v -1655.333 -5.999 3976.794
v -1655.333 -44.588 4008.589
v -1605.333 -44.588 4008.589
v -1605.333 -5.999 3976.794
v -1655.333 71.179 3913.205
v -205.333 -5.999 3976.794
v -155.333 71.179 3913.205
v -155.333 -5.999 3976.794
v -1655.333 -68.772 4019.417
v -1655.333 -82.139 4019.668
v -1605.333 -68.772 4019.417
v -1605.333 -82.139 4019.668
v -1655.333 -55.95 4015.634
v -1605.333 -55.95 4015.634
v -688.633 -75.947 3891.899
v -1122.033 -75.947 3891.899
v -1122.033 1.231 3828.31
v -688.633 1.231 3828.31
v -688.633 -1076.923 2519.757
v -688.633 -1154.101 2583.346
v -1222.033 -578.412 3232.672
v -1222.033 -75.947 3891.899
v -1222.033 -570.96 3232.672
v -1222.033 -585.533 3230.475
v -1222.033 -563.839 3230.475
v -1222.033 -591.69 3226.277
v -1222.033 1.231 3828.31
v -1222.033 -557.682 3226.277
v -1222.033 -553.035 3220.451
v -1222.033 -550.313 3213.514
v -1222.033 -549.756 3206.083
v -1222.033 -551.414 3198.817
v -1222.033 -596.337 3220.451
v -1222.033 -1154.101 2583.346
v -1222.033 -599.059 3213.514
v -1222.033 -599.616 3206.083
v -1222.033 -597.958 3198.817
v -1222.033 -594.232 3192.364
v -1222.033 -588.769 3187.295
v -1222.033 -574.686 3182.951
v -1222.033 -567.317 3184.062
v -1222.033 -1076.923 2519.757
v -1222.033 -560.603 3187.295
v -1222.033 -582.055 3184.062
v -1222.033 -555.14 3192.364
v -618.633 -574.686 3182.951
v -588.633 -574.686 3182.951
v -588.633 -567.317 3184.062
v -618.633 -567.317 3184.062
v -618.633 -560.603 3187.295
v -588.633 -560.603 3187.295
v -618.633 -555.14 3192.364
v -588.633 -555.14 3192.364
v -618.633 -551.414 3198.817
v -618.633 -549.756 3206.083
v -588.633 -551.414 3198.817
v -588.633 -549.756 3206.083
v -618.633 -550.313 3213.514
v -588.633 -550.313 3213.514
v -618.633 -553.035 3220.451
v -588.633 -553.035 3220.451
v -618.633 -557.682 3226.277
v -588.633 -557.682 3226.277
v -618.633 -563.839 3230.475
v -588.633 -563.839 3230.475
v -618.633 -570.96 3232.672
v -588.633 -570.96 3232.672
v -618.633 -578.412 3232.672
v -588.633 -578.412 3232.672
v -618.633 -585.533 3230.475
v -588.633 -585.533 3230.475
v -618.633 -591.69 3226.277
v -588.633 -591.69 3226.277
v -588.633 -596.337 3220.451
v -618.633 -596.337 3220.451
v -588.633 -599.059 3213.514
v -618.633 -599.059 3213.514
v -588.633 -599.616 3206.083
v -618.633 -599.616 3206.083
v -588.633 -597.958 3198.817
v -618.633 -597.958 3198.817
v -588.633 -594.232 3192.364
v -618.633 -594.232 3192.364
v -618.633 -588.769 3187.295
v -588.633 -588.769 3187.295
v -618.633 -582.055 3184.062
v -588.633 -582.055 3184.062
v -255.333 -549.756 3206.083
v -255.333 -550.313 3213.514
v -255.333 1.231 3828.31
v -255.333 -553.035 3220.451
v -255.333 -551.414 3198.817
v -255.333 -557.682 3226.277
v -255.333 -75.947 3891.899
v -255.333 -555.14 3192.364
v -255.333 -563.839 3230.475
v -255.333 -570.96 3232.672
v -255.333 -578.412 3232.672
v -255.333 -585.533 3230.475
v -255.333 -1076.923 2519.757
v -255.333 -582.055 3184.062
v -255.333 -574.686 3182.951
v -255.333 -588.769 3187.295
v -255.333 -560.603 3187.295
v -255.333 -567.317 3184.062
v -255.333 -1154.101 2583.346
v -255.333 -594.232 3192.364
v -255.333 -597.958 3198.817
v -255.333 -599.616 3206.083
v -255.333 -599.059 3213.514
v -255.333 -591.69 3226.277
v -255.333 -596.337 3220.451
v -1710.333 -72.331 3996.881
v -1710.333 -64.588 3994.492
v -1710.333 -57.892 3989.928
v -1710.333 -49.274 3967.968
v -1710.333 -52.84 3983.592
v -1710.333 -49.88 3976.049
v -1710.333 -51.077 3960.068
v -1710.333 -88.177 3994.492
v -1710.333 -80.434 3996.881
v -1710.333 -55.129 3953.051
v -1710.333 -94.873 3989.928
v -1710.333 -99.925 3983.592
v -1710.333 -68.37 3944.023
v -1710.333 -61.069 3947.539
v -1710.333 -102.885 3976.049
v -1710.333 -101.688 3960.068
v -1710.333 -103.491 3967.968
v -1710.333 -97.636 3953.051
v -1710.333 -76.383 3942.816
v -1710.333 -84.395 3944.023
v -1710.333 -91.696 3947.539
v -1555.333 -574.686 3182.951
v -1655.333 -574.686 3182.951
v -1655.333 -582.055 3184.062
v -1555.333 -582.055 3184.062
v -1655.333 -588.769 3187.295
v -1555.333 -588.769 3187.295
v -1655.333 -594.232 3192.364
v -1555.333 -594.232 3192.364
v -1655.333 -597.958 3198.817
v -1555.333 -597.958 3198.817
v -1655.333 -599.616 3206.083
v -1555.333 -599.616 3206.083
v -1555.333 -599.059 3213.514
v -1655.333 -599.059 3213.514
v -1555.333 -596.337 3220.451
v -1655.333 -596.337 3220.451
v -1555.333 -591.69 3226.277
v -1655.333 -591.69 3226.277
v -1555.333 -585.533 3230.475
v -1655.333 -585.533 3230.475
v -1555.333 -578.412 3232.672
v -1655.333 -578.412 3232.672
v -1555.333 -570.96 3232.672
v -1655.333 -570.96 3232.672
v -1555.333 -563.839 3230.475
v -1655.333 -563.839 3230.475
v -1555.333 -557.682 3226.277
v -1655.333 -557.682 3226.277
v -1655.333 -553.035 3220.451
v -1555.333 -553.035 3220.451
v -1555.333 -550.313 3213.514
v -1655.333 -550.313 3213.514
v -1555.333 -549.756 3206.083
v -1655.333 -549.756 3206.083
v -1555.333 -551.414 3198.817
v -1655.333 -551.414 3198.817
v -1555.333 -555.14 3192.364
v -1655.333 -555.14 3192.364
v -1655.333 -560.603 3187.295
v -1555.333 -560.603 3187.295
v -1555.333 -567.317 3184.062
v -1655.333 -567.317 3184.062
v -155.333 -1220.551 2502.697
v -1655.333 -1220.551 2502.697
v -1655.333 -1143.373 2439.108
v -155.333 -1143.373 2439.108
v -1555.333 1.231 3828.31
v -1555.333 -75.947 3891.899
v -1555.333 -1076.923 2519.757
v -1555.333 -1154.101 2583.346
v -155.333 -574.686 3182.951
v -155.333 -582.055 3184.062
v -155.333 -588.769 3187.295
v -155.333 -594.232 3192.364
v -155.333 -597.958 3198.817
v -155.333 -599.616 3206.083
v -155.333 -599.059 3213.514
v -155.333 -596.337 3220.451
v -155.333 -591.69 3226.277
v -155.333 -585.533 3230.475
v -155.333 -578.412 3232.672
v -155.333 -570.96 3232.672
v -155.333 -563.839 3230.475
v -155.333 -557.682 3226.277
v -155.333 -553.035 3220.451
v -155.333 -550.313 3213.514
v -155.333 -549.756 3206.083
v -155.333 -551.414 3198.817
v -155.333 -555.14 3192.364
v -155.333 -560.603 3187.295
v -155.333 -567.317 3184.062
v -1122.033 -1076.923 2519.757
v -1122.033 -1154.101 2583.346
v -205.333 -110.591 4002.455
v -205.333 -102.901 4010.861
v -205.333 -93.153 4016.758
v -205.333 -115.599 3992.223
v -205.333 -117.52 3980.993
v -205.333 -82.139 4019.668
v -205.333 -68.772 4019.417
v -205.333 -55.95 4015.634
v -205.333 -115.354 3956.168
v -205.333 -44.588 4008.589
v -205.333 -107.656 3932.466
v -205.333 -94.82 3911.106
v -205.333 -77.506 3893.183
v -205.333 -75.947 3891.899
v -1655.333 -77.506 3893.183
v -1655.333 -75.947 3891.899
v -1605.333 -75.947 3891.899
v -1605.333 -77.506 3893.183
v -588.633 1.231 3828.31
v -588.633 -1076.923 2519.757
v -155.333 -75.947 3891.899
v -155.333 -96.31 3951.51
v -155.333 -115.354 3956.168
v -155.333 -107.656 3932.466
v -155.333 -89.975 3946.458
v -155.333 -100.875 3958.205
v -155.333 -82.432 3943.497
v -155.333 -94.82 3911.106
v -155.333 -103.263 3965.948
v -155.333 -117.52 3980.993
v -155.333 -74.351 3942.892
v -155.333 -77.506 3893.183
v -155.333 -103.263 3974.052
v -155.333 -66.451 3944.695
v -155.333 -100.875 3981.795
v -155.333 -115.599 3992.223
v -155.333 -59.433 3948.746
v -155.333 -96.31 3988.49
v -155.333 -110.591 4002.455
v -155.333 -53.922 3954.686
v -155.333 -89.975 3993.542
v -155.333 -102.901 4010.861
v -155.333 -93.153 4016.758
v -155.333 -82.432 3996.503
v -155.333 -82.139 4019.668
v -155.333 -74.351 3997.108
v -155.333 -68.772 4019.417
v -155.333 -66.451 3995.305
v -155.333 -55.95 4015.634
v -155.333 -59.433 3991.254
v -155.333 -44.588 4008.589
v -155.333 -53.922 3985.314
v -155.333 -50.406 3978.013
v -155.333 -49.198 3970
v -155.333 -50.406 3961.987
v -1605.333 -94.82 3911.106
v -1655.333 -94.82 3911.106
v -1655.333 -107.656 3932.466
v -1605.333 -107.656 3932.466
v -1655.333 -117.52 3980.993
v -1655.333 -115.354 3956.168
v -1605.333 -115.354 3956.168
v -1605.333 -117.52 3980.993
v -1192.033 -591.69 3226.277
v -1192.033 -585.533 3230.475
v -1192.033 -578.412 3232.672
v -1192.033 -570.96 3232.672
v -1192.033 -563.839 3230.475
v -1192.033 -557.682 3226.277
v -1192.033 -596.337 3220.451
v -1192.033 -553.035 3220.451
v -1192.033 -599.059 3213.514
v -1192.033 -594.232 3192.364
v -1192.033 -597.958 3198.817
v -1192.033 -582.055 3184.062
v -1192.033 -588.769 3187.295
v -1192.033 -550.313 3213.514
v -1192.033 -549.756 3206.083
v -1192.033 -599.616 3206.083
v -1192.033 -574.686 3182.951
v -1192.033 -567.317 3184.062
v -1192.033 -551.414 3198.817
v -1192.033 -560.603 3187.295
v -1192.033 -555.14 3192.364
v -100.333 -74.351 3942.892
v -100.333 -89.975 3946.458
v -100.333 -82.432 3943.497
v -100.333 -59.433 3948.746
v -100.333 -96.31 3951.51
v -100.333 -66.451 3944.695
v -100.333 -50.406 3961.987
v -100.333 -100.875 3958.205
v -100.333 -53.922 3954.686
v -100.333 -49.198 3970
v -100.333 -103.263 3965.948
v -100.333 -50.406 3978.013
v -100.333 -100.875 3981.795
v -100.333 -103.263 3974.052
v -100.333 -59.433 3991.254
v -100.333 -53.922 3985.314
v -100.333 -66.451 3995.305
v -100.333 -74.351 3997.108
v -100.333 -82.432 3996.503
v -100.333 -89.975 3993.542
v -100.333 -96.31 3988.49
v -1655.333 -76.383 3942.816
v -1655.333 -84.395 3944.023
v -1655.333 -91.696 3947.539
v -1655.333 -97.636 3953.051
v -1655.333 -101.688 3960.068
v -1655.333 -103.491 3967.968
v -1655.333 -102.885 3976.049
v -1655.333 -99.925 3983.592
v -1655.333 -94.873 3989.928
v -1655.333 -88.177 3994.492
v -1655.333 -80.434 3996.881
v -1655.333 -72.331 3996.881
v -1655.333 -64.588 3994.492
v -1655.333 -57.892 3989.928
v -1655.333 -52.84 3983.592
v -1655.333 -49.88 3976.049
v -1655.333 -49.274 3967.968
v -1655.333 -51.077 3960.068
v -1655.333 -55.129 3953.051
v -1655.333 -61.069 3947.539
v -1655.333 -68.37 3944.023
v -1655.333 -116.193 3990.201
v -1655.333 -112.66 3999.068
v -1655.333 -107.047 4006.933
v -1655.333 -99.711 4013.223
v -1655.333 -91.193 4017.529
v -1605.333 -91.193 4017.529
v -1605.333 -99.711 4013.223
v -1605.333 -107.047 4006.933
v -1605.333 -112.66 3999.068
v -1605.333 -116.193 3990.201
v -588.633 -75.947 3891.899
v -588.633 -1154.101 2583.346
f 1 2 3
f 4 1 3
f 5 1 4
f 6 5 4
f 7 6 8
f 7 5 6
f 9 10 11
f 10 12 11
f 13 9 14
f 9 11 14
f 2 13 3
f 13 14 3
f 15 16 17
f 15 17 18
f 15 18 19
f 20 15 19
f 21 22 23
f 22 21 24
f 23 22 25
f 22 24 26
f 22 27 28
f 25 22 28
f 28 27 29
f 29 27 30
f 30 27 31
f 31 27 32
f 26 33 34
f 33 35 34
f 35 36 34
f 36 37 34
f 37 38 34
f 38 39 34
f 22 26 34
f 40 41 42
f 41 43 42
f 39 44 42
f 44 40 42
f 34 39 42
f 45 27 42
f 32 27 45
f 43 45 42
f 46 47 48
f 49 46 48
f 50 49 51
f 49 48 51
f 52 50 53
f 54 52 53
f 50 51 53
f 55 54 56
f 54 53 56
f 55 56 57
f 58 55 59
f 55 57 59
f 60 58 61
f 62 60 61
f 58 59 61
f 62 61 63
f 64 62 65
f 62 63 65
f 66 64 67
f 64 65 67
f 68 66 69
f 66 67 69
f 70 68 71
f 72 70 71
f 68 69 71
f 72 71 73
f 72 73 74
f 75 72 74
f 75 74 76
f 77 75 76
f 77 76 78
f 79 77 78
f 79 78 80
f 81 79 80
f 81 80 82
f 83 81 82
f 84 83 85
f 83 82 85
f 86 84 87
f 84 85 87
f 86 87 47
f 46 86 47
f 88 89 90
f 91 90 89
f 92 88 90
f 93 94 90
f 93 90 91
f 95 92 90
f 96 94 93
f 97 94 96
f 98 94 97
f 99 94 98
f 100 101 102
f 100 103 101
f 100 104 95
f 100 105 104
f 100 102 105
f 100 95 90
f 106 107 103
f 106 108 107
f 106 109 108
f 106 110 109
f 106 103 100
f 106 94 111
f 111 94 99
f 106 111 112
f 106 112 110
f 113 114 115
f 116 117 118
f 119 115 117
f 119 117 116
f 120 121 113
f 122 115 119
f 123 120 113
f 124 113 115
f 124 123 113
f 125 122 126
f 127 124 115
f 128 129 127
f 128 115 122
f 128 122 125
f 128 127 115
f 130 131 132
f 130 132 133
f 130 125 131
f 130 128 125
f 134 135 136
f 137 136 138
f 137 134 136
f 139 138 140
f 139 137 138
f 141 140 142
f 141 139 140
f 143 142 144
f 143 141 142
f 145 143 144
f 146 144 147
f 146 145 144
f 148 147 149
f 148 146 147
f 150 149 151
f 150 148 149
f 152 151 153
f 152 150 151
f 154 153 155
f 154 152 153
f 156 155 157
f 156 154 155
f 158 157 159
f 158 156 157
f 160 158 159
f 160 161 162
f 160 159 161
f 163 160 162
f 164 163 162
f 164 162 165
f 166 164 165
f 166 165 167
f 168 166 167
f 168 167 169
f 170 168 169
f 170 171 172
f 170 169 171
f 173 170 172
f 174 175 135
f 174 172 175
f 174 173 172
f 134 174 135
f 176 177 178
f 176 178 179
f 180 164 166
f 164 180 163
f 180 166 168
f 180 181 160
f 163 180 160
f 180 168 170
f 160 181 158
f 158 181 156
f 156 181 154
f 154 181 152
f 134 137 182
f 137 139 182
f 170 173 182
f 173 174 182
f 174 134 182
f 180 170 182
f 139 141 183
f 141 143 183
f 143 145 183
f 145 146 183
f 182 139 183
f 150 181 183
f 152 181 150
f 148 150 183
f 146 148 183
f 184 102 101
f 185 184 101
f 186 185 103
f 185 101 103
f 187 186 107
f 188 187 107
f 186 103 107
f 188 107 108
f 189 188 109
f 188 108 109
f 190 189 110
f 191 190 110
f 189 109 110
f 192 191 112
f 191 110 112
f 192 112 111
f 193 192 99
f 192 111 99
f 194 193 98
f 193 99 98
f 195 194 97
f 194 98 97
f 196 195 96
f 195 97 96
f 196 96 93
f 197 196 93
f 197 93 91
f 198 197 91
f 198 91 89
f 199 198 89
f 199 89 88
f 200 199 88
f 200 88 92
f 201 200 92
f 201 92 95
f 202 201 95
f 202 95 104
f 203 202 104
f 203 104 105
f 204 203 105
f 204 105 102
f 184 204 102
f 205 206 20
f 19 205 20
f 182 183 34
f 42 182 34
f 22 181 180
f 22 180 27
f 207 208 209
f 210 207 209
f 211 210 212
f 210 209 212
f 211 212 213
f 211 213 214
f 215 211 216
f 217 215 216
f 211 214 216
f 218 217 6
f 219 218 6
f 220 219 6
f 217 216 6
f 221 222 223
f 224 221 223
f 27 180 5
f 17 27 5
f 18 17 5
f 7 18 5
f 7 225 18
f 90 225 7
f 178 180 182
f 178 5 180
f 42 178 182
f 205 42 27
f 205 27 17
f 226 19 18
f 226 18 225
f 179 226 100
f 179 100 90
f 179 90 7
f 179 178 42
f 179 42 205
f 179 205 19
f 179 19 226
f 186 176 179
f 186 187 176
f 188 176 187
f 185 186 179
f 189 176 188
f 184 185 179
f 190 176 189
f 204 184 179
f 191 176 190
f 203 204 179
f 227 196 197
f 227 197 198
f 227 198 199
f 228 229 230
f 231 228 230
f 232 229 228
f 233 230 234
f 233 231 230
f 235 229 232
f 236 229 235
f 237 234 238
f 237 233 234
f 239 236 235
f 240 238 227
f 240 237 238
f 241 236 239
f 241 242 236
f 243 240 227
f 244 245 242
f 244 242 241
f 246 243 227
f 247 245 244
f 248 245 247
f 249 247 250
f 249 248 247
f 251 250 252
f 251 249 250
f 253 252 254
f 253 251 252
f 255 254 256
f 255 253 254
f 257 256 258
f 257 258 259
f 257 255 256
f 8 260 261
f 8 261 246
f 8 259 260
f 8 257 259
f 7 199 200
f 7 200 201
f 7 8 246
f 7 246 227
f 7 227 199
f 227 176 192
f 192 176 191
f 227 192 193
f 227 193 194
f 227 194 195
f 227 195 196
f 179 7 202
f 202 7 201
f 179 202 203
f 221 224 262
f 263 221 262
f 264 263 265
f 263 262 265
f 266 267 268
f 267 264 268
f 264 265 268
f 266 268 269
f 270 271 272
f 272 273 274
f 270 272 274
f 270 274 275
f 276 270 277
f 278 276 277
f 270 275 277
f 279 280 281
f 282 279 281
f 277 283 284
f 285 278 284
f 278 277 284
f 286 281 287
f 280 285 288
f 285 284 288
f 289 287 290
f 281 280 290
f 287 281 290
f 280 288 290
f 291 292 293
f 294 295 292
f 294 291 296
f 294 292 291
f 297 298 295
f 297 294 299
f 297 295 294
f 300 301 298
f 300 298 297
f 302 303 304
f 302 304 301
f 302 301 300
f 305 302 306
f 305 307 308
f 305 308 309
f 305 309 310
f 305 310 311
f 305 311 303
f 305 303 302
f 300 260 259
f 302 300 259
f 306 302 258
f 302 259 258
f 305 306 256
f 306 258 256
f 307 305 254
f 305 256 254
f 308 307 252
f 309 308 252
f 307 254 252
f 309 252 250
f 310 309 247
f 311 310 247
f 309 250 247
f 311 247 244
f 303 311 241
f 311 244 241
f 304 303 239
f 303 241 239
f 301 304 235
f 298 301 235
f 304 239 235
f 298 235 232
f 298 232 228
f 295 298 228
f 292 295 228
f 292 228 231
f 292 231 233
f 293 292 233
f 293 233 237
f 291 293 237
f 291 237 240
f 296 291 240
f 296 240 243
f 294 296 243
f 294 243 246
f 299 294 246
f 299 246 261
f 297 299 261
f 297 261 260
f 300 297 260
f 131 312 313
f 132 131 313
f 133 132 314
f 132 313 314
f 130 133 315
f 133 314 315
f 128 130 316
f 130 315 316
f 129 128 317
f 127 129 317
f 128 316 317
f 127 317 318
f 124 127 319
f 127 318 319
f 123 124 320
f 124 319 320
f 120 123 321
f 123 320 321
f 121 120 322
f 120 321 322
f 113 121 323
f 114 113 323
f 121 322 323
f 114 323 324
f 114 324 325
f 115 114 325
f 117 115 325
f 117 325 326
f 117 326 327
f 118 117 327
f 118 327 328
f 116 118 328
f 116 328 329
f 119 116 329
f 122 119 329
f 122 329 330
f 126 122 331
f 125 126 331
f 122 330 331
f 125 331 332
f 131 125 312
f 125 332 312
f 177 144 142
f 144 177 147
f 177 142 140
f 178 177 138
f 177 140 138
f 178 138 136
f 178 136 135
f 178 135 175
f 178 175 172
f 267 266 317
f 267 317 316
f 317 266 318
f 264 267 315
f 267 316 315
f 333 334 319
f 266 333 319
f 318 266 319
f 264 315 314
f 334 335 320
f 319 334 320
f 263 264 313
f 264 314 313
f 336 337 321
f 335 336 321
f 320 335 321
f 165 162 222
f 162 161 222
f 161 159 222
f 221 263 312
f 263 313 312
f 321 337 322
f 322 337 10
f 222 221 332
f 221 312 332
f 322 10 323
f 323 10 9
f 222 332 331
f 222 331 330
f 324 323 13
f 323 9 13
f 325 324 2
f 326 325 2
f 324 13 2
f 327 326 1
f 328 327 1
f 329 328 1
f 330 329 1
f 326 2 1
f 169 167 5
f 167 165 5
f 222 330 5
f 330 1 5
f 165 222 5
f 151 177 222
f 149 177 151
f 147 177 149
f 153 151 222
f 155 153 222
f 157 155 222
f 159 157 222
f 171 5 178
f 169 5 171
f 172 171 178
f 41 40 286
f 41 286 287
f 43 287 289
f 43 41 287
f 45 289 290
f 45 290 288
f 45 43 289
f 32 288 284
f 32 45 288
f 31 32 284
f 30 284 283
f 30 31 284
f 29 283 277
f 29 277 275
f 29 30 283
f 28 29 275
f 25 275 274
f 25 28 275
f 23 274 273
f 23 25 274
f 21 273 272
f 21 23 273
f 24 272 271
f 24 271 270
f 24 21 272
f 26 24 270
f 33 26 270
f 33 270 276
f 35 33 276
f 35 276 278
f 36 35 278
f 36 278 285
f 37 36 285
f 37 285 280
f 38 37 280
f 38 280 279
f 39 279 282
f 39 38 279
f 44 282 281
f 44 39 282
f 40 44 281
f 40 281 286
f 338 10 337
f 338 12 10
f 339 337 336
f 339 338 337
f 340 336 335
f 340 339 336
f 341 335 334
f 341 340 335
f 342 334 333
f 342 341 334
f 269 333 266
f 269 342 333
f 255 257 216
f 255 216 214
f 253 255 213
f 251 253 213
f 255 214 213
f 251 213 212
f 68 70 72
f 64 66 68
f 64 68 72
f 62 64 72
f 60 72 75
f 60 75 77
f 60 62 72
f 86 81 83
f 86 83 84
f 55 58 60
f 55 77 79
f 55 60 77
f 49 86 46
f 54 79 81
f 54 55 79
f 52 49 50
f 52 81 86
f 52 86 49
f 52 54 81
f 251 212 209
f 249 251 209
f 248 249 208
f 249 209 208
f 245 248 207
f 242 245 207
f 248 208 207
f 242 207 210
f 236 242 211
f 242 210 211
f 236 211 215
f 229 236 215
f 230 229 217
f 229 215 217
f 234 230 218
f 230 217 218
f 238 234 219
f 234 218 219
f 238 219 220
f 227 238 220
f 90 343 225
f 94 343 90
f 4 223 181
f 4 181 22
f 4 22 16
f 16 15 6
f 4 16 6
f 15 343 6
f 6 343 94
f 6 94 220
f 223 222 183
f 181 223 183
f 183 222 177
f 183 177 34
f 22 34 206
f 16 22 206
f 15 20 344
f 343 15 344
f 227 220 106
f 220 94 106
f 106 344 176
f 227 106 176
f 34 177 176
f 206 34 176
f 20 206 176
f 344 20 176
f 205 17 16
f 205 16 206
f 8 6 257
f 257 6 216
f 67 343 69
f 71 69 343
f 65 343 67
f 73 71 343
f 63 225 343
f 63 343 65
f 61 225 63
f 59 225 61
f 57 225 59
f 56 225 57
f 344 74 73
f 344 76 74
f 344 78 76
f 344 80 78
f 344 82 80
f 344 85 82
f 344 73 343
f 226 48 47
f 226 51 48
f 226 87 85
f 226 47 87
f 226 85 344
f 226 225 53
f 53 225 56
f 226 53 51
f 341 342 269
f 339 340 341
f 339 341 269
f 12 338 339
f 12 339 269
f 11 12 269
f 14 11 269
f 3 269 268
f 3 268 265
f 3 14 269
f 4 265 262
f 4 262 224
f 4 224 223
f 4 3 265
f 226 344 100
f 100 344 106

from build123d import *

# Parameters (mm, degrees)
CROQUIS1_W              = 1500
CROQUIS1_H              = 1910
CROQUIS1_W_2            = 1300
CROQUIS1_H_2            = 1695.501409597
SALIENTE_EXTRUIR1_DEPTH = 100
CROQUIS2_W              = 50
CROQUIS2_H              = 100
SALIENTE_EXTRUIR2_DEPTH = 110
CROQUIS3_R              = 27.184499999
SALIENTE_EXTRUIR3_DEPTH = 55
REDONDEO1_R             = 50
REDONDEO2_R             = 110
REDONDEO3_R             = 40
SIMETR_A6_START         = -205.332665454
SIMETR_A6_DEPTH         = 50
SIMETR_A6_2_OUTLINE_R   = 27.184499999
SIMETR_A6_2_DEPTH       = 105
CROQUIS4_W              = 100
CROQUIS4_H              = 1695.501409597
SALIENTE_EXTRUIR4_DEPTH = 100
CROQUIS5_R              = 25
CORTAR_EXTRUIR1_DEPTH   = 30
CROQUIS6_R              = 25
CORTAR_EXTRUIR3_DEPTH   = 4447.028443617


with BuildPart() as part:
    # Croquis1 → Saliente-Extruir1 (new body)
    with BuildSketch(Plane(origin=(0, -1955.253607577, 1610.989797583), x_dir=(1, 0, 0), z_dir=(0, 0.771778946447621, -0.6358909166045701))):
        with Locations((-905.332665454, -2110.391476147)):
            Rectangle(CROQUIS1_W, CROQUIS1_H)
        with Locations((-905.332665454, -2107.640771349)):
            Rectangle(CROQUIS1_W_2, CROQUIS1_H_2, mode=Mode.SUBTRACT)
    extrude(amount=SALIENTE_EXTRUIR1_DEPTH)

    # Croquis2 → Saliente-Extruir2 (add)
    with BuildSketch(Plane(origin=(0, 1949.254595519, 2365.804603911), x_dir=(1, 0, 0), z_dir=(-5.363902149474557e-15, 0.6358909166045701, 0.771778946447621))):
        with Locations((-1630.332665455, -2583.437348319)):
            Rectangle(CROQUIS2_W, CROQUIS2_H)
    extrude(amount=-SALIENTE_EXTRUIR2_DEPTH)

    # Croquis3 → Saliente-Extruir3 (add)
    with BuildSketch(Plane.ZY.offset(1655.332665454)):
        with Locations(Location((3970.000000001, -76.38250521, 0), (0, 0, 180))):
            Circle(CROQUIS3_R)
    extrude(amount=SALIENTE_EXTRUIR3_DEPTH)

    # Redondeo1
    redondeo1_edges = [part.edges().sort_by_distance(p)[0] for p in [
        (-1630.332665454, -83.176906702, 4040.383493154),
    ]]
    fillet(redondeo1_edges, radius=REDONDEO1_R)

    # Redondeo2
    # the kernel refuses this fillet: 110 mm, written as the material it takes off along each edge
    with BuildSketch(Plane(origin=(-1360.383691176, -153.124907529, 3955.487809045), x_dir=(-5.363902149475724e-15, 0.6358909166045759, 0.7717789464476161), z_dir=(-1, 0, 0))) as redondeo2_piece_1:
        with BuildLine():
            CenterArc((110, 97.979589711), REDONDEO2_R, 180, 62.964308211)
            Line((0, 97.979589711), (0, 0))
            Line((0, 0), (60, 0))
        make_face()
    extrude(amount=539.897948557, mode=Mode.SUBTRACT)

    # Redondeo3
    redondeo3_edges = [part.edges().sort_by_distance(p)[0] for p in [
        (-1630.332665454, -114.971452533, 4001.794545831),
    ]]
    fillet(redondeo3_edges, radius=REDONDEO3_R)

    # Simetría6: read off the stored shape, not the designer's step
    # Simetría6 outline → Simetría6 (add)
    with BuildSketch(Plane.YZ.offset(SIMETR_A6_START)):
        with BuildLine():
            ThreePointArc((-117.519718806, 3980.993137388), (-107.655684266, 3932.466465304), (-77.506323008, 3893.183477935))
            Line((-77.506323008, 3893.183477935), (-75.947012884, 3891.898717384))
            Line((-75.947012884, 3891.898717384), (-5.999012058, 3976.794401493))
            Line((-5.999012058, 3976.794401493), (-44.58795938, 4008.588947324))
            ThreePointArc((-44.58795938, 4008.588947324), (-62.233936584, 4017.956417776), (-82.138761146, 4019.667549947))
            ThreePointArc((-82.138761146, 4019.667549947), (-107.046738875, 4006.933211198), (-117.519718806, 3980.993137388))
        make_face()
    extrude(amount=SIMETR_A6_DEPTH)

    # Simetr_a6 2 outline → Simetr_a6 2 (add)
    with BuildSketch(Plane.YZ.offset(SIMETR_A6_START)):
        with Locations((-76.38250521, 3970.000000001)):
            Circle(SIMETR_A6_2_OUTLINE_R)
    extrude(amount=SIMETR_A6_2_DEPTH)

    # Croquis4 → Saliente-Extruir4 (add)
    with BuildSketch(Plane(origin=(0, -1878.075712932, 1547.400705922), x_dir=(1, 0, 0), z_dir=(0, 0.771778946447621, -0.63589091660457))):
        with Locations((-1172.032665454, -2107.640771349)):
            Rectangle(CROQUIS4_W, CROQUIS4_H)
        with Locations((-638.632665454, -2107.640771349)):
            Rectangle(CROQUIS4_W, CROQUIS4_H)
    extrude(amount=-SALIENTE_EXTRUIR4_DEPTH)

    # Croquis5 → Cortar-Extruir1 (cut)
    with BuildSketch(Plane(origin=(-588.632665454, 0, 0), x_dir=(0, 0, -1), z_dir=(1, 0, 0))):
        with Locations((-3207.950961806, -574.685890092)):
            Circle(CROQUIS5_R)
    cortar_extruir1 = extrude(amount=-CORTAR_EXTRUIR1_DEPTH, mode=Mode.SUBTRACT)

    # Croquis6 → Cortar-Extruir3 (cut, through all)
    with BuildSketch(Plane.ZY.offset(255.332665454)):
        with Locations(Location((3207.950961806, -574.685890092, 0), (0, 0, 180))):
            Circle(CROQUIS6_R)
    cortar_extruir3 = extrude(amount=-CORTAR_EXTRUIR3_DEPTH, mode=Mode.SUBTRACT)

    # Simetría11: Cortar-Extruir1, Cortar-Extruir3 across plane
    add(cortar_extruir1.mirror(Plane(origin=(-905.332665454, 0, 0), x_dir=(0, 0, 1), z_dir=(1, 0, 0))), mode=Mode.SUBTRACT)
    add(cortar_extruir3.mirror(Plane(origin=(-905.332665454, 0, 0), x_dir=(0, 0, 1), z_dir=(1, 0, 0))), mode=Mode.SUBTRACT)


solid = part.part
